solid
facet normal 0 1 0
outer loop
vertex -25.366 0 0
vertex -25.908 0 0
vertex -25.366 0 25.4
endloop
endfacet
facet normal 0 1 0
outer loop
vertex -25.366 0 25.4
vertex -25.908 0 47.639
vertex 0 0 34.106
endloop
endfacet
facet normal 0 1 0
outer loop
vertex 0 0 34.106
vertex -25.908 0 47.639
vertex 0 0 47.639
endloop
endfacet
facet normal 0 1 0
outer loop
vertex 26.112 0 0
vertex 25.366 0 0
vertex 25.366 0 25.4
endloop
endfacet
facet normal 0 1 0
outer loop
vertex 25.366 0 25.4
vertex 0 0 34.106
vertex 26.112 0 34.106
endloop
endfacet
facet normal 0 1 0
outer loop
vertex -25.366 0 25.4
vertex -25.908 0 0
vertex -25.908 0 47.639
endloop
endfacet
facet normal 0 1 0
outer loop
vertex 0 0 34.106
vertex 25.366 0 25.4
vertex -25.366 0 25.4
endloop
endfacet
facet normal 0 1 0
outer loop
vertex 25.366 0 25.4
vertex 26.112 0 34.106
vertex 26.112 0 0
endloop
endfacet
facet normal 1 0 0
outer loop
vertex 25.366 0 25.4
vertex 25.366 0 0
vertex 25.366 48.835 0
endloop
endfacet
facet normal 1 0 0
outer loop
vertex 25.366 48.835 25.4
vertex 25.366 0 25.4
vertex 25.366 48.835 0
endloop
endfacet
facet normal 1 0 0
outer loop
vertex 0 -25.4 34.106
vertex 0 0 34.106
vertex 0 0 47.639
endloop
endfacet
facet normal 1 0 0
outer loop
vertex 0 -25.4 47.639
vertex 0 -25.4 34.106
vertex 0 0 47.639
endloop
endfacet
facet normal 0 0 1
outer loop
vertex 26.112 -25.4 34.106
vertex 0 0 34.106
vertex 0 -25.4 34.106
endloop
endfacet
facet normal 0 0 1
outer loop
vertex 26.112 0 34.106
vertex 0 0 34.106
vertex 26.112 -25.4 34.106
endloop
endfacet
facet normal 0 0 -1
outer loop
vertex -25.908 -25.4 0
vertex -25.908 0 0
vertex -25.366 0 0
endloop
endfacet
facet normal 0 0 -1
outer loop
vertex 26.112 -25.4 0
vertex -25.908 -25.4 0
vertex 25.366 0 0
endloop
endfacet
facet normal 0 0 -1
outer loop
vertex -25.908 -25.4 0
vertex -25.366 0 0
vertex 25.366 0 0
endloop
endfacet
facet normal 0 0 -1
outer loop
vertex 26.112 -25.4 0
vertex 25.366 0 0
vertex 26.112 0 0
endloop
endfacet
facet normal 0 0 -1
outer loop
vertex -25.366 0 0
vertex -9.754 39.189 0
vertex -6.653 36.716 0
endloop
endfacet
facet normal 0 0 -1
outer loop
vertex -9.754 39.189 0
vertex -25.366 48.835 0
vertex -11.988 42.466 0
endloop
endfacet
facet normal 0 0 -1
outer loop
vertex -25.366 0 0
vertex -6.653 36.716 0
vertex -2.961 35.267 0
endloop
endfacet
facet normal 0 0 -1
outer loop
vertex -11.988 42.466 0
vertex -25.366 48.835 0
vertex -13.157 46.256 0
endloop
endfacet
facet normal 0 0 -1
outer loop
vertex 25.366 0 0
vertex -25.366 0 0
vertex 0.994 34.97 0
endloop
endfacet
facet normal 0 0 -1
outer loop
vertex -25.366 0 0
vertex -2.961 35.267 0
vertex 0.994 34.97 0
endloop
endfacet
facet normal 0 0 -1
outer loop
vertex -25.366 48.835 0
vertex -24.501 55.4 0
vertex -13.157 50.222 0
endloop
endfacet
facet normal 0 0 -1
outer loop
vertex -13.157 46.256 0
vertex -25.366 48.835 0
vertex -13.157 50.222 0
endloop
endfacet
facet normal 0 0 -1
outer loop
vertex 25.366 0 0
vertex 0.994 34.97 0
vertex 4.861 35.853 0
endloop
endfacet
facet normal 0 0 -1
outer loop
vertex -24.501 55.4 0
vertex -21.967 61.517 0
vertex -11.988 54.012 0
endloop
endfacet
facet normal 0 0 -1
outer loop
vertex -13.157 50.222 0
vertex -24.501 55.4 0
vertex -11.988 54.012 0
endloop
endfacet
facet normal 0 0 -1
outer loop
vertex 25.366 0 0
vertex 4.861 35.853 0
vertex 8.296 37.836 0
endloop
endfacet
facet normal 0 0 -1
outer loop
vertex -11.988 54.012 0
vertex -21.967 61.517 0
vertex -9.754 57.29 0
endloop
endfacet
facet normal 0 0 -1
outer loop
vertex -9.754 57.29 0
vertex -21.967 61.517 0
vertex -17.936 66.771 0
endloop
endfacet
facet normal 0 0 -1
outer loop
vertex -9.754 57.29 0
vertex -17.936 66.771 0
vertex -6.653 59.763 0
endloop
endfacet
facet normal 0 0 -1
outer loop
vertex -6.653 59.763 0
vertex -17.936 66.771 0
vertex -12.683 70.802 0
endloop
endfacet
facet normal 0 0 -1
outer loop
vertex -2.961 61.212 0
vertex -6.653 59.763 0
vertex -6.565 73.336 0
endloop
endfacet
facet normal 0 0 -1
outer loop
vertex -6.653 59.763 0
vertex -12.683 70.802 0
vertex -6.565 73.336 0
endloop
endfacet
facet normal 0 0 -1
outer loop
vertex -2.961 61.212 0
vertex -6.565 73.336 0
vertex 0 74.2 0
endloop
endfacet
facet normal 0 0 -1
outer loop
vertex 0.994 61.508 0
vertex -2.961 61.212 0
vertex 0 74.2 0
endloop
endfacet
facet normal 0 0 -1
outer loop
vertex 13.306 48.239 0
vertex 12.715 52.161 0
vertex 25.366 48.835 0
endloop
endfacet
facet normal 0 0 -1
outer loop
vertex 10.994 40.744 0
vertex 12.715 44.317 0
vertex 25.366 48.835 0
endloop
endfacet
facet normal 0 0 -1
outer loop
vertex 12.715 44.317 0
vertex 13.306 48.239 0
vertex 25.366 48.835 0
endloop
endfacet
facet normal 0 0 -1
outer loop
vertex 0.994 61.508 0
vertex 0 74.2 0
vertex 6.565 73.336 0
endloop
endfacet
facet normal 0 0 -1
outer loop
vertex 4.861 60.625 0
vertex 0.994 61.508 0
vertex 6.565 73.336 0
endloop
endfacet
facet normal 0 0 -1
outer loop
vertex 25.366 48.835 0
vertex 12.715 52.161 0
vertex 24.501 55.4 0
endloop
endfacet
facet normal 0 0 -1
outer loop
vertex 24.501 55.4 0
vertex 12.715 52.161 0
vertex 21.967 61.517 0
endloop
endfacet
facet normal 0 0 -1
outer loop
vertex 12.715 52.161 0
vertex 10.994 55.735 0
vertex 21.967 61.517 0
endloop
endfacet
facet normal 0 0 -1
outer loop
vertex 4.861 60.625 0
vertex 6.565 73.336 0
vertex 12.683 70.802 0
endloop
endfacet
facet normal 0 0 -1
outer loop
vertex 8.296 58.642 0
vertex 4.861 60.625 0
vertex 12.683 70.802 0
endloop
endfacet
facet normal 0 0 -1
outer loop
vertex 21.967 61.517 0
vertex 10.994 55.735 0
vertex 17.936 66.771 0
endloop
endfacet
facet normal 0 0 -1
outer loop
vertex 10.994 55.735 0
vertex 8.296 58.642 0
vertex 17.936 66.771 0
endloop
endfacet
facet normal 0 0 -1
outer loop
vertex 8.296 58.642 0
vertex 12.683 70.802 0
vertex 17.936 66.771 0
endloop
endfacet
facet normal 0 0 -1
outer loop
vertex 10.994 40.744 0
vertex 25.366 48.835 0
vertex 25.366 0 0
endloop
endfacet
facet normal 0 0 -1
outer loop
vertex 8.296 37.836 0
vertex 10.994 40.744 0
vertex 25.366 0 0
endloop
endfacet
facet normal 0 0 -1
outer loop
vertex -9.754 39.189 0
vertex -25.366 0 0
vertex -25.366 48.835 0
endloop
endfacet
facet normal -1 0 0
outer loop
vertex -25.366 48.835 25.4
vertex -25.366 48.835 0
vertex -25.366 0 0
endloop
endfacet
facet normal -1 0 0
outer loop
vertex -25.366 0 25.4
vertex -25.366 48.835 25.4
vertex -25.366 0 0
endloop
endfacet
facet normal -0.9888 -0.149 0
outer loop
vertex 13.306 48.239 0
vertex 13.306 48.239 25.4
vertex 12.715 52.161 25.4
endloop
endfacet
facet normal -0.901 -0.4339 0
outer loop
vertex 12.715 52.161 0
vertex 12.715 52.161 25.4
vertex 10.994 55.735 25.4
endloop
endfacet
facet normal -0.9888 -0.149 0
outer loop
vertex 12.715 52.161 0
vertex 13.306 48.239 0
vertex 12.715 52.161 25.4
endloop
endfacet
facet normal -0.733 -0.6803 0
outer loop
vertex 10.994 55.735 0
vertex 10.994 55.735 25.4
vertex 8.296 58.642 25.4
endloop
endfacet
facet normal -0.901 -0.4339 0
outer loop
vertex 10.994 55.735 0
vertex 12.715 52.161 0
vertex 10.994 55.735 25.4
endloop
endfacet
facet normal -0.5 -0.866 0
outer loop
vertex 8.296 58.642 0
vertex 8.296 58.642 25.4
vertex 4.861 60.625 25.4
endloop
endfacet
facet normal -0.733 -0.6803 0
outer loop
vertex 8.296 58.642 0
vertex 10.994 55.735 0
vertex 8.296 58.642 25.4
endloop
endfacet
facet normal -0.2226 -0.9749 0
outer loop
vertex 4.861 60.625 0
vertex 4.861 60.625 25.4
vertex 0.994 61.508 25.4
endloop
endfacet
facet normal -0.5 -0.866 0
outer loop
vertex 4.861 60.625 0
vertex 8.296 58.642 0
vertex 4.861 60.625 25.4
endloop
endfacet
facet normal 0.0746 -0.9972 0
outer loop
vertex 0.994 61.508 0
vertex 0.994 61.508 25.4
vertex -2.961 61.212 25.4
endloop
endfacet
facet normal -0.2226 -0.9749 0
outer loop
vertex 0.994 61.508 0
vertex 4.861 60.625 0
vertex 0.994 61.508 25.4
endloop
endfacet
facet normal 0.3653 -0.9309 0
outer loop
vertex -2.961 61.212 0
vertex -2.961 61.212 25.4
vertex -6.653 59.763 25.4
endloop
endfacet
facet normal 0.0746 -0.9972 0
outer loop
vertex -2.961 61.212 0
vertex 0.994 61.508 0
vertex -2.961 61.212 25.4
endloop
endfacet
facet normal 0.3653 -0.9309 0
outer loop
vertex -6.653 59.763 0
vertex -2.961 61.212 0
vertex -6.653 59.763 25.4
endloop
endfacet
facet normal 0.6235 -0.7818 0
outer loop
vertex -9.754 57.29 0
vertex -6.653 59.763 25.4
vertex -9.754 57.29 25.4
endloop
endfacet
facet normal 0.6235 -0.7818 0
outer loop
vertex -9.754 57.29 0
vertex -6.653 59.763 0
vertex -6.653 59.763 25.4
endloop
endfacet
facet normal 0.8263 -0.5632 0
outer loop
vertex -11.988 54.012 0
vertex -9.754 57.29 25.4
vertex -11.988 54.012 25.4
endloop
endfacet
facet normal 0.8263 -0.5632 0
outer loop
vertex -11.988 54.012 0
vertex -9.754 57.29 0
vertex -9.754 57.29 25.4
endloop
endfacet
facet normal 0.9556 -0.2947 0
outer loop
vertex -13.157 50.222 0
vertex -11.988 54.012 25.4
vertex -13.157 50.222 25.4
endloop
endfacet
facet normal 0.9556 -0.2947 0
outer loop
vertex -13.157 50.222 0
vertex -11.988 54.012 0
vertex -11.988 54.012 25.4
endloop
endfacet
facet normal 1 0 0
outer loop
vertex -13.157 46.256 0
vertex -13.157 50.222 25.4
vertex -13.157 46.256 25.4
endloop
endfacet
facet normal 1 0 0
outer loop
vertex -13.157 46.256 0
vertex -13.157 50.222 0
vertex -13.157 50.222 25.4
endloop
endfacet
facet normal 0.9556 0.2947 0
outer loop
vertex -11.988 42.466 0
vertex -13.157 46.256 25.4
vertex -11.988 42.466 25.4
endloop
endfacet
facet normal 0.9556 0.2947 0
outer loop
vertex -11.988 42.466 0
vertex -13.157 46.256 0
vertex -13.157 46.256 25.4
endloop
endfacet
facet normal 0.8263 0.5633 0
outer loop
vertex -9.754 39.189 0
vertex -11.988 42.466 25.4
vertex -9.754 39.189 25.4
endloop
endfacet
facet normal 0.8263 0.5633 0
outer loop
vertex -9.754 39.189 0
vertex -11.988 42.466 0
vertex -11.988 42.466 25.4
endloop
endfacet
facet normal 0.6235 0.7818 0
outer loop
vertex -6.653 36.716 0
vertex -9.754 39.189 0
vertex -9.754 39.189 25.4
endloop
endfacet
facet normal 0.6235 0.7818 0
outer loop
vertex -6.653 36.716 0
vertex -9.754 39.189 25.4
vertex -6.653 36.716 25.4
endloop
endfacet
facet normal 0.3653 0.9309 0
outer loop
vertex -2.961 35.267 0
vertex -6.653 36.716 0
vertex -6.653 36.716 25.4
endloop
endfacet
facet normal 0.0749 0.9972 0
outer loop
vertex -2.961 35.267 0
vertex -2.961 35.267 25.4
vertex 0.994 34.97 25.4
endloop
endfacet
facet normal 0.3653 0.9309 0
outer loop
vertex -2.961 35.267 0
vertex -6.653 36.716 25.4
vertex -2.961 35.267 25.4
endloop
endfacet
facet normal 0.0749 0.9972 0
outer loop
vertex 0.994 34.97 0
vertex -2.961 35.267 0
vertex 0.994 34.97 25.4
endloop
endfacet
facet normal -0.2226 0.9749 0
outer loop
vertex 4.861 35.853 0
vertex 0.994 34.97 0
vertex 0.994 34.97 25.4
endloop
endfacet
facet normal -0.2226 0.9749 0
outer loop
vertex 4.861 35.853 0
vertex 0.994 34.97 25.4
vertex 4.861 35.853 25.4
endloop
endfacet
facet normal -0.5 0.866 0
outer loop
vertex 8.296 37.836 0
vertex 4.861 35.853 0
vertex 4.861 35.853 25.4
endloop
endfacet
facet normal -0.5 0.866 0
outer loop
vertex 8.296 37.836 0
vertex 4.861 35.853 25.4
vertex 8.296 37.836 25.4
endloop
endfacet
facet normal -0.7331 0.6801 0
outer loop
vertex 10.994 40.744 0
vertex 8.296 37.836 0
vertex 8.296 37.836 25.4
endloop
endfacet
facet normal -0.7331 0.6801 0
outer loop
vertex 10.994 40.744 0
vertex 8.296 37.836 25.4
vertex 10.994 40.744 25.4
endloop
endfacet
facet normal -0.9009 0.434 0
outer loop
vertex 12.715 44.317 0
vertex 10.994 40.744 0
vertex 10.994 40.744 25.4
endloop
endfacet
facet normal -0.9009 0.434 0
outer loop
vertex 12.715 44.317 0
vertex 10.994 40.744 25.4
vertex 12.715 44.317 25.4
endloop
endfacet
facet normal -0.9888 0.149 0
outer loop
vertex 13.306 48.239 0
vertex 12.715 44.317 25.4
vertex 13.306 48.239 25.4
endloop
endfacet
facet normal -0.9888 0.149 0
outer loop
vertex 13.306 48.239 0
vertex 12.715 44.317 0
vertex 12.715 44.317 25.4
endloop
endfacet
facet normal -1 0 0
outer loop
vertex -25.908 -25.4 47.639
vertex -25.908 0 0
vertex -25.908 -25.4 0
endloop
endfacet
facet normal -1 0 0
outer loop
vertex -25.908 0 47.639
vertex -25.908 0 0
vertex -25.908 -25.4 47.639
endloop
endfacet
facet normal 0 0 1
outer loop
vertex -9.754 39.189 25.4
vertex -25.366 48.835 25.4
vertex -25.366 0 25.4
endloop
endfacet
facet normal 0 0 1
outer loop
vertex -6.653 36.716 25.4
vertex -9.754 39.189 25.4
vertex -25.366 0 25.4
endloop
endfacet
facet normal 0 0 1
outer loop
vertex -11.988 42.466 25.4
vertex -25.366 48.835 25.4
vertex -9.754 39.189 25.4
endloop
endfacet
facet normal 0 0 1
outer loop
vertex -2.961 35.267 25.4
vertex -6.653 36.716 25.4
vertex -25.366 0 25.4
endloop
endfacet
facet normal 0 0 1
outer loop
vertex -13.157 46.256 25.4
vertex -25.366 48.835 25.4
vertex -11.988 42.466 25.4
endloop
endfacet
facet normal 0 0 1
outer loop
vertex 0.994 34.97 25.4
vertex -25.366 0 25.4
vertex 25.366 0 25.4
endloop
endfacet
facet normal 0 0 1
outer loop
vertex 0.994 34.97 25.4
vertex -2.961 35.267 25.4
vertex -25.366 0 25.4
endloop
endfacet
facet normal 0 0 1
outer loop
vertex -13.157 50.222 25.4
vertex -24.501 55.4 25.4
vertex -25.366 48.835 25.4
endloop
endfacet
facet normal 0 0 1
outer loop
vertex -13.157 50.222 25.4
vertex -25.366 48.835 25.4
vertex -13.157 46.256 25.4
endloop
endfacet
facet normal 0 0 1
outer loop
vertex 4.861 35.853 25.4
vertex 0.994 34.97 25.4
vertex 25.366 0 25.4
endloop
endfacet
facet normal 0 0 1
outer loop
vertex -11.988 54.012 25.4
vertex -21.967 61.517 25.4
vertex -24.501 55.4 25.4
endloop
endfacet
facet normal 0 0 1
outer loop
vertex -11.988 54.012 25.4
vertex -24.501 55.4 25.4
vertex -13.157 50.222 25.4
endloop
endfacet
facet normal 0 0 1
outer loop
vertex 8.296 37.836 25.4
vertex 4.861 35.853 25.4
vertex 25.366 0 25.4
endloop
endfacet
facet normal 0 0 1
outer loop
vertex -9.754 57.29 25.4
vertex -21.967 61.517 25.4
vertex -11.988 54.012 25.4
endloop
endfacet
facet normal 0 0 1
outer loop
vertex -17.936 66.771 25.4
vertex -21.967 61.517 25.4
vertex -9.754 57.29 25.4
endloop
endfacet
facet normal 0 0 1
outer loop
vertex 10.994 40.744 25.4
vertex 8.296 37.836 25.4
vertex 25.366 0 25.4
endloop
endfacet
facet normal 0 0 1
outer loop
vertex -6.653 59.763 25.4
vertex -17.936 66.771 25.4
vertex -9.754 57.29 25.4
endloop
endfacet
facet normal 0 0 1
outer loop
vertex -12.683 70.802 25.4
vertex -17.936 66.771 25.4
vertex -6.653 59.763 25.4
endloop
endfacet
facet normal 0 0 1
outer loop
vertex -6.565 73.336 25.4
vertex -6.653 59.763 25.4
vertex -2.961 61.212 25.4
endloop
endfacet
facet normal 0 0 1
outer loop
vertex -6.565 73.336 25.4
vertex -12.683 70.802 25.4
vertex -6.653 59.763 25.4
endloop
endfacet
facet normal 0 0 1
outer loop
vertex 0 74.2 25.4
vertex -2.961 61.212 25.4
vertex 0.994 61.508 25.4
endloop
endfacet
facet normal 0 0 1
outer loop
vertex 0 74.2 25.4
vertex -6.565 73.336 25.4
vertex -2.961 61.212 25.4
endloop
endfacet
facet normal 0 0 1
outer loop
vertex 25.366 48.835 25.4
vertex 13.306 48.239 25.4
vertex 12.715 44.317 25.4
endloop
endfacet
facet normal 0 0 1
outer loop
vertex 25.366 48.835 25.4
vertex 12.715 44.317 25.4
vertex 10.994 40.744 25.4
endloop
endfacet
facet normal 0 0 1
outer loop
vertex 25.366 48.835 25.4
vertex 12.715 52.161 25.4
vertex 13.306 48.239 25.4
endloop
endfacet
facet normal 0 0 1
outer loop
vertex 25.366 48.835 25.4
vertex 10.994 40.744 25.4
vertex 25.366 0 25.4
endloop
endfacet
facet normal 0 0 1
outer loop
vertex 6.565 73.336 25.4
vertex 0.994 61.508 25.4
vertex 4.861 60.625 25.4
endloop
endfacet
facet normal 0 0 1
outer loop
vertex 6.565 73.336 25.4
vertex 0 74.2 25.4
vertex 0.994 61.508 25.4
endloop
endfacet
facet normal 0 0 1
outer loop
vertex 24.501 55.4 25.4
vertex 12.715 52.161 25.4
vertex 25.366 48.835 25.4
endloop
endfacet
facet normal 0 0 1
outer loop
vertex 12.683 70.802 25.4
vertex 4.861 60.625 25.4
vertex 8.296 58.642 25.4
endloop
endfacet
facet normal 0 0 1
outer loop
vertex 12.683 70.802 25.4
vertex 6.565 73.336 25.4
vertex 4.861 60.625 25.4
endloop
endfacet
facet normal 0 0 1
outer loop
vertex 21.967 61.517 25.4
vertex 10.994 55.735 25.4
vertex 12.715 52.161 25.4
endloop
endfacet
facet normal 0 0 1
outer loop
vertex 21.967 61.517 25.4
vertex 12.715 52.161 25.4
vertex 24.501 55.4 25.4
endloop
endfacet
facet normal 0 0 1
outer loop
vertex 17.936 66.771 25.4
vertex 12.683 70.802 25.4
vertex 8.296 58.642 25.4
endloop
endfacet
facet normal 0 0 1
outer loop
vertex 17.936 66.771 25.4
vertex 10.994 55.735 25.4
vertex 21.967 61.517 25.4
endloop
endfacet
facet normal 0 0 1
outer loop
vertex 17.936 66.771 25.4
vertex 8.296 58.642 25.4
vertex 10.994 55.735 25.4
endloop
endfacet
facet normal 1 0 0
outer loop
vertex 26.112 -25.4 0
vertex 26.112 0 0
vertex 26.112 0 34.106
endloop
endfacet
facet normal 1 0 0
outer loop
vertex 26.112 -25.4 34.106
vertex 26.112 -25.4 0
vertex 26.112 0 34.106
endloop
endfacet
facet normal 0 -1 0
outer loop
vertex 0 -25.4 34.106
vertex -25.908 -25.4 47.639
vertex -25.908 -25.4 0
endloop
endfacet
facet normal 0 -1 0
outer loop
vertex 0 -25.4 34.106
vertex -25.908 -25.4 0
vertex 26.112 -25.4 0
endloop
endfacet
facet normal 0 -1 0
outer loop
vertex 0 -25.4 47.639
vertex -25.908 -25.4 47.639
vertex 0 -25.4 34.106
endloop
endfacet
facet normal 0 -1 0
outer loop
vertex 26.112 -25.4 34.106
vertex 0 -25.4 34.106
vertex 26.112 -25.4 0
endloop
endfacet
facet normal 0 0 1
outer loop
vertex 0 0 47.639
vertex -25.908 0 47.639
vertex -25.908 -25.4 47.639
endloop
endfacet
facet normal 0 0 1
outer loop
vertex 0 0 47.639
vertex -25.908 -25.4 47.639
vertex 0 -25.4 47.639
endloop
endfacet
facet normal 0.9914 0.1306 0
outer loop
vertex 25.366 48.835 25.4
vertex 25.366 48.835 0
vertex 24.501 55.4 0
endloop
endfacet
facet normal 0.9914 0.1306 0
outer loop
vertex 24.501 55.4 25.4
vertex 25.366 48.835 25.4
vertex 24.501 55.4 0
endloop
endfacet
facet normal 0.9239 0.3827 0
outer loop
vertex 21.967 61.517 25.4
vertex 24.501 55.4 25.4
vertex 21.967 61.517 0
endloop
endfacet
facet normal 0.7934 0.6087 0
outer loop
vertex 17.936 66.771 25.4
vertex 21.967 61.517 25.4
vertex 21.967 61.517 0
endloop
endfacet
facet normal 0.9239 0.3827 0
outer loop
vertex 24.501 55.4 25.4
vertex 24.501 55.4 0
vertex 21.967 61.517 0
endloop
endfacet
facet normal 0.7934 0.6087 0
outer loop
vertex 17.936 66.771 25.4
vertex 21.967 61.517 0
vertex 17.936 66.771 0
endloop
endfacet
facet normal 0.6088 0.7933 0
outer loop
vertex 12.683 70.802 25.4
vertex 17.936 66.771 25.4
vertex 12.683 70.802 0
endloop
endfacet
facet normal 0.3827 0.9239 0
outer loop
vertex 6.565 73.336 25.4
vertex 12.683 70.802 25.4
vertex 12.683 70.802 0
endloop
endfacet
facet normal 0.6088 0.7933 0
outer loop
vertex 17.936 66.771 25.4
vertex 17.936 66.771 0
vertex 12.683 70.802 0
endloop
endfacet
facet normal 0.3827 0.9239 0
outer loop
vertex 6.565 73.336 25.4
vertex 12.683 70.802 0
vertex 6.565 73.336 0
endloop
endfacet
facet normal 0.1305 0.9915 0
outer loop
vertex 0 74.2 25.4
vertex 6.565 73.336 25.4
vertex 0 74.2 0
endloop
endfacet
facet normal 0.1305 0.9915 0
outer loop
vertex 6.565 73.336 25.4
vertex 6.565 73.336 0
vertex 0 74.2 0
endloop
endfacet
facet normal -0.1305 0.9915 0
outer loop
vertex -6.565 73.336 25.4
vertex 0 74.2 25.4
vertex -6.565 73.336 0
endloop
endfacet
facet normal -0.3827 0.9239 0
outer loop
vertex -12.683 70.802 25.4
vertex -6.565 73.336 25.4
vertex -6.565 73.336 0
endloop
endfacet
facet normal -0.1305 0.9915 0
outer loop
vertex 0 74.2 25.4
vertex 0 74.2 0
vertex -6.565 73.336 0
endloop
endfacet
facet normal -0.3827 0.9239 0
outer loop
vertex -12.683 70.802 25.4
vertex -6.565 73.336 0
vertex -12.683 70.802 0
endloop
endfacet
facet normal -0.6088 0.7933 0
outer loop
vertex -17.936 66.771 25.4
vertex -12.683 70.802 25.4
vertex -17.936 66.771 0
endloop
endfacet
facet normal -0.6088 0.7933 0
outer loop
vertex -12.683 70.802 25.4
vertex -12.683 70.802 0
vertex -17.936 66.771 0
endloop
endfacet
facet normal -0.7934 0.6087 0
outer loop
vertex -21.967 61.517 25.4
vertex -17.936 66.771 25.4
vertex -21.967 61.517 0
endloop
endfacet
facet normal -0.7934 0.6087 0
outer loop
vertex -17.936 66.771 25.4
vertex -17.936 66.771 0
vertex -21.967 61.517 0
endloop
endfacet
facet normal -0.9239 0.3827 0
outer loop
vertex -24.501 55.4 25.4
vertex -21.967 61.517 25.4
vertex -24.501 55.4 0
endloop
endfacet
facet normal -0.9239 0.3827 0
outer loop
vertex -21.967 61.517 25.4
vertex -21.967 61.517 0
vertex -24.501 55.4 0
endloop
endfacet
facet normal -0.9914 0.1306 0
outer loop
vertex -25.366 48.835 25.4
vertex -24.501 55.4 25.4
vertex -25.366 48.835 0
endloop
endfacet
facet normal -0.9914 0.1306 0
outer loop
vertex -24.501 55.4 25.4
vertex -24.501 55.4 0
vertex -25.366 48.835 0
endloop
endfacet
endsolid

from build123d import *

# Parameters (mm, degrees)
F1_DEPTH = 25.4
F2_R     = 13.3061005932
F3_DEPTH = 25.401
F5_DEPTH = 25.401
F6_W     = 52.0203243941
F6_H     = 47.6390495896
F7_DEPTH = 25.4
F8_W     = 26.2038465589
F8_H     = 14.3460799009
F9_DEPTH = 25.4


with BuildPart() as f1:
    # F0 (on Top) → F1 (new body)
    with BuildSketch(Plane.XY):
        with BuildLine():
            Line((-25.3657195717, 48.8345064223), (25.3657195717, 48.8345064223))
            ThreePointArc((25.3657195717, 48.8345064223), (0, 74.200225994), (-25.3657195717, 48.8345064223))
        make_face()
        with BuildLine():
            Line((25.3657195717, 0), (25.3657195717, 48.8345064223))
            ThreePointArc((25.3657195717, 48.8345064223), (0, 23.4687868506), (-25.3657195717, 48.8345064223))
            Line((-25.3657195717, 48.8345064223), (-25.3657195717, 0))
            Line((-25.3657195717, 0), (25.3657195717, 0))
        make_face()
        with BuildLine():
            ThreePointArc((-25.3657195717, 48.8345064223), (0, 23.4687868506), (25.3657195717, 48.8345064223))
            Line((25.3657195717, 48.8345064223), (-25.3657195717, 48.8345064223))
        make_face()
    extrude(amount=F1_DEPTH)

    # F2 (on Top) → F3 (cut, through all)
    with BuildSketch(Plane.XY):
        with Locations((0, 48.2391826808)):
            Circle(F2_R)
    extrude(amount=F3_DEPTH, mode=Mode.SUBTRACT)

    # F2 (on Top) → F5 (cut, through all)
    with BuildSketch(Plane.XY):
        with Locations((0, 48.2391826808)):
            Circle(F2_R)
    extrude(amount=F5_DEPTH, mode=Mode.SUBTRACT)

    # F6 (on Front) → F7 (join)
    with BuildSketch(Plane.XZ):
        with Locations((0.1023123041, 23.8195247948)):
            Rectangle(F6_W, F6_H)
    extrude(amount=F7_DEPTH)

    # F8 (on Front) → F9 (cut)
    with BuildSketch(Plane.XZ):
        with Locations((13.1019232795, 41.2792069837)):
            Rectangle(F8_W, F8_H)
    extrude(amount=F9_DEPTH, mode=Mode.SUBTRACT)


solid = f1.part
